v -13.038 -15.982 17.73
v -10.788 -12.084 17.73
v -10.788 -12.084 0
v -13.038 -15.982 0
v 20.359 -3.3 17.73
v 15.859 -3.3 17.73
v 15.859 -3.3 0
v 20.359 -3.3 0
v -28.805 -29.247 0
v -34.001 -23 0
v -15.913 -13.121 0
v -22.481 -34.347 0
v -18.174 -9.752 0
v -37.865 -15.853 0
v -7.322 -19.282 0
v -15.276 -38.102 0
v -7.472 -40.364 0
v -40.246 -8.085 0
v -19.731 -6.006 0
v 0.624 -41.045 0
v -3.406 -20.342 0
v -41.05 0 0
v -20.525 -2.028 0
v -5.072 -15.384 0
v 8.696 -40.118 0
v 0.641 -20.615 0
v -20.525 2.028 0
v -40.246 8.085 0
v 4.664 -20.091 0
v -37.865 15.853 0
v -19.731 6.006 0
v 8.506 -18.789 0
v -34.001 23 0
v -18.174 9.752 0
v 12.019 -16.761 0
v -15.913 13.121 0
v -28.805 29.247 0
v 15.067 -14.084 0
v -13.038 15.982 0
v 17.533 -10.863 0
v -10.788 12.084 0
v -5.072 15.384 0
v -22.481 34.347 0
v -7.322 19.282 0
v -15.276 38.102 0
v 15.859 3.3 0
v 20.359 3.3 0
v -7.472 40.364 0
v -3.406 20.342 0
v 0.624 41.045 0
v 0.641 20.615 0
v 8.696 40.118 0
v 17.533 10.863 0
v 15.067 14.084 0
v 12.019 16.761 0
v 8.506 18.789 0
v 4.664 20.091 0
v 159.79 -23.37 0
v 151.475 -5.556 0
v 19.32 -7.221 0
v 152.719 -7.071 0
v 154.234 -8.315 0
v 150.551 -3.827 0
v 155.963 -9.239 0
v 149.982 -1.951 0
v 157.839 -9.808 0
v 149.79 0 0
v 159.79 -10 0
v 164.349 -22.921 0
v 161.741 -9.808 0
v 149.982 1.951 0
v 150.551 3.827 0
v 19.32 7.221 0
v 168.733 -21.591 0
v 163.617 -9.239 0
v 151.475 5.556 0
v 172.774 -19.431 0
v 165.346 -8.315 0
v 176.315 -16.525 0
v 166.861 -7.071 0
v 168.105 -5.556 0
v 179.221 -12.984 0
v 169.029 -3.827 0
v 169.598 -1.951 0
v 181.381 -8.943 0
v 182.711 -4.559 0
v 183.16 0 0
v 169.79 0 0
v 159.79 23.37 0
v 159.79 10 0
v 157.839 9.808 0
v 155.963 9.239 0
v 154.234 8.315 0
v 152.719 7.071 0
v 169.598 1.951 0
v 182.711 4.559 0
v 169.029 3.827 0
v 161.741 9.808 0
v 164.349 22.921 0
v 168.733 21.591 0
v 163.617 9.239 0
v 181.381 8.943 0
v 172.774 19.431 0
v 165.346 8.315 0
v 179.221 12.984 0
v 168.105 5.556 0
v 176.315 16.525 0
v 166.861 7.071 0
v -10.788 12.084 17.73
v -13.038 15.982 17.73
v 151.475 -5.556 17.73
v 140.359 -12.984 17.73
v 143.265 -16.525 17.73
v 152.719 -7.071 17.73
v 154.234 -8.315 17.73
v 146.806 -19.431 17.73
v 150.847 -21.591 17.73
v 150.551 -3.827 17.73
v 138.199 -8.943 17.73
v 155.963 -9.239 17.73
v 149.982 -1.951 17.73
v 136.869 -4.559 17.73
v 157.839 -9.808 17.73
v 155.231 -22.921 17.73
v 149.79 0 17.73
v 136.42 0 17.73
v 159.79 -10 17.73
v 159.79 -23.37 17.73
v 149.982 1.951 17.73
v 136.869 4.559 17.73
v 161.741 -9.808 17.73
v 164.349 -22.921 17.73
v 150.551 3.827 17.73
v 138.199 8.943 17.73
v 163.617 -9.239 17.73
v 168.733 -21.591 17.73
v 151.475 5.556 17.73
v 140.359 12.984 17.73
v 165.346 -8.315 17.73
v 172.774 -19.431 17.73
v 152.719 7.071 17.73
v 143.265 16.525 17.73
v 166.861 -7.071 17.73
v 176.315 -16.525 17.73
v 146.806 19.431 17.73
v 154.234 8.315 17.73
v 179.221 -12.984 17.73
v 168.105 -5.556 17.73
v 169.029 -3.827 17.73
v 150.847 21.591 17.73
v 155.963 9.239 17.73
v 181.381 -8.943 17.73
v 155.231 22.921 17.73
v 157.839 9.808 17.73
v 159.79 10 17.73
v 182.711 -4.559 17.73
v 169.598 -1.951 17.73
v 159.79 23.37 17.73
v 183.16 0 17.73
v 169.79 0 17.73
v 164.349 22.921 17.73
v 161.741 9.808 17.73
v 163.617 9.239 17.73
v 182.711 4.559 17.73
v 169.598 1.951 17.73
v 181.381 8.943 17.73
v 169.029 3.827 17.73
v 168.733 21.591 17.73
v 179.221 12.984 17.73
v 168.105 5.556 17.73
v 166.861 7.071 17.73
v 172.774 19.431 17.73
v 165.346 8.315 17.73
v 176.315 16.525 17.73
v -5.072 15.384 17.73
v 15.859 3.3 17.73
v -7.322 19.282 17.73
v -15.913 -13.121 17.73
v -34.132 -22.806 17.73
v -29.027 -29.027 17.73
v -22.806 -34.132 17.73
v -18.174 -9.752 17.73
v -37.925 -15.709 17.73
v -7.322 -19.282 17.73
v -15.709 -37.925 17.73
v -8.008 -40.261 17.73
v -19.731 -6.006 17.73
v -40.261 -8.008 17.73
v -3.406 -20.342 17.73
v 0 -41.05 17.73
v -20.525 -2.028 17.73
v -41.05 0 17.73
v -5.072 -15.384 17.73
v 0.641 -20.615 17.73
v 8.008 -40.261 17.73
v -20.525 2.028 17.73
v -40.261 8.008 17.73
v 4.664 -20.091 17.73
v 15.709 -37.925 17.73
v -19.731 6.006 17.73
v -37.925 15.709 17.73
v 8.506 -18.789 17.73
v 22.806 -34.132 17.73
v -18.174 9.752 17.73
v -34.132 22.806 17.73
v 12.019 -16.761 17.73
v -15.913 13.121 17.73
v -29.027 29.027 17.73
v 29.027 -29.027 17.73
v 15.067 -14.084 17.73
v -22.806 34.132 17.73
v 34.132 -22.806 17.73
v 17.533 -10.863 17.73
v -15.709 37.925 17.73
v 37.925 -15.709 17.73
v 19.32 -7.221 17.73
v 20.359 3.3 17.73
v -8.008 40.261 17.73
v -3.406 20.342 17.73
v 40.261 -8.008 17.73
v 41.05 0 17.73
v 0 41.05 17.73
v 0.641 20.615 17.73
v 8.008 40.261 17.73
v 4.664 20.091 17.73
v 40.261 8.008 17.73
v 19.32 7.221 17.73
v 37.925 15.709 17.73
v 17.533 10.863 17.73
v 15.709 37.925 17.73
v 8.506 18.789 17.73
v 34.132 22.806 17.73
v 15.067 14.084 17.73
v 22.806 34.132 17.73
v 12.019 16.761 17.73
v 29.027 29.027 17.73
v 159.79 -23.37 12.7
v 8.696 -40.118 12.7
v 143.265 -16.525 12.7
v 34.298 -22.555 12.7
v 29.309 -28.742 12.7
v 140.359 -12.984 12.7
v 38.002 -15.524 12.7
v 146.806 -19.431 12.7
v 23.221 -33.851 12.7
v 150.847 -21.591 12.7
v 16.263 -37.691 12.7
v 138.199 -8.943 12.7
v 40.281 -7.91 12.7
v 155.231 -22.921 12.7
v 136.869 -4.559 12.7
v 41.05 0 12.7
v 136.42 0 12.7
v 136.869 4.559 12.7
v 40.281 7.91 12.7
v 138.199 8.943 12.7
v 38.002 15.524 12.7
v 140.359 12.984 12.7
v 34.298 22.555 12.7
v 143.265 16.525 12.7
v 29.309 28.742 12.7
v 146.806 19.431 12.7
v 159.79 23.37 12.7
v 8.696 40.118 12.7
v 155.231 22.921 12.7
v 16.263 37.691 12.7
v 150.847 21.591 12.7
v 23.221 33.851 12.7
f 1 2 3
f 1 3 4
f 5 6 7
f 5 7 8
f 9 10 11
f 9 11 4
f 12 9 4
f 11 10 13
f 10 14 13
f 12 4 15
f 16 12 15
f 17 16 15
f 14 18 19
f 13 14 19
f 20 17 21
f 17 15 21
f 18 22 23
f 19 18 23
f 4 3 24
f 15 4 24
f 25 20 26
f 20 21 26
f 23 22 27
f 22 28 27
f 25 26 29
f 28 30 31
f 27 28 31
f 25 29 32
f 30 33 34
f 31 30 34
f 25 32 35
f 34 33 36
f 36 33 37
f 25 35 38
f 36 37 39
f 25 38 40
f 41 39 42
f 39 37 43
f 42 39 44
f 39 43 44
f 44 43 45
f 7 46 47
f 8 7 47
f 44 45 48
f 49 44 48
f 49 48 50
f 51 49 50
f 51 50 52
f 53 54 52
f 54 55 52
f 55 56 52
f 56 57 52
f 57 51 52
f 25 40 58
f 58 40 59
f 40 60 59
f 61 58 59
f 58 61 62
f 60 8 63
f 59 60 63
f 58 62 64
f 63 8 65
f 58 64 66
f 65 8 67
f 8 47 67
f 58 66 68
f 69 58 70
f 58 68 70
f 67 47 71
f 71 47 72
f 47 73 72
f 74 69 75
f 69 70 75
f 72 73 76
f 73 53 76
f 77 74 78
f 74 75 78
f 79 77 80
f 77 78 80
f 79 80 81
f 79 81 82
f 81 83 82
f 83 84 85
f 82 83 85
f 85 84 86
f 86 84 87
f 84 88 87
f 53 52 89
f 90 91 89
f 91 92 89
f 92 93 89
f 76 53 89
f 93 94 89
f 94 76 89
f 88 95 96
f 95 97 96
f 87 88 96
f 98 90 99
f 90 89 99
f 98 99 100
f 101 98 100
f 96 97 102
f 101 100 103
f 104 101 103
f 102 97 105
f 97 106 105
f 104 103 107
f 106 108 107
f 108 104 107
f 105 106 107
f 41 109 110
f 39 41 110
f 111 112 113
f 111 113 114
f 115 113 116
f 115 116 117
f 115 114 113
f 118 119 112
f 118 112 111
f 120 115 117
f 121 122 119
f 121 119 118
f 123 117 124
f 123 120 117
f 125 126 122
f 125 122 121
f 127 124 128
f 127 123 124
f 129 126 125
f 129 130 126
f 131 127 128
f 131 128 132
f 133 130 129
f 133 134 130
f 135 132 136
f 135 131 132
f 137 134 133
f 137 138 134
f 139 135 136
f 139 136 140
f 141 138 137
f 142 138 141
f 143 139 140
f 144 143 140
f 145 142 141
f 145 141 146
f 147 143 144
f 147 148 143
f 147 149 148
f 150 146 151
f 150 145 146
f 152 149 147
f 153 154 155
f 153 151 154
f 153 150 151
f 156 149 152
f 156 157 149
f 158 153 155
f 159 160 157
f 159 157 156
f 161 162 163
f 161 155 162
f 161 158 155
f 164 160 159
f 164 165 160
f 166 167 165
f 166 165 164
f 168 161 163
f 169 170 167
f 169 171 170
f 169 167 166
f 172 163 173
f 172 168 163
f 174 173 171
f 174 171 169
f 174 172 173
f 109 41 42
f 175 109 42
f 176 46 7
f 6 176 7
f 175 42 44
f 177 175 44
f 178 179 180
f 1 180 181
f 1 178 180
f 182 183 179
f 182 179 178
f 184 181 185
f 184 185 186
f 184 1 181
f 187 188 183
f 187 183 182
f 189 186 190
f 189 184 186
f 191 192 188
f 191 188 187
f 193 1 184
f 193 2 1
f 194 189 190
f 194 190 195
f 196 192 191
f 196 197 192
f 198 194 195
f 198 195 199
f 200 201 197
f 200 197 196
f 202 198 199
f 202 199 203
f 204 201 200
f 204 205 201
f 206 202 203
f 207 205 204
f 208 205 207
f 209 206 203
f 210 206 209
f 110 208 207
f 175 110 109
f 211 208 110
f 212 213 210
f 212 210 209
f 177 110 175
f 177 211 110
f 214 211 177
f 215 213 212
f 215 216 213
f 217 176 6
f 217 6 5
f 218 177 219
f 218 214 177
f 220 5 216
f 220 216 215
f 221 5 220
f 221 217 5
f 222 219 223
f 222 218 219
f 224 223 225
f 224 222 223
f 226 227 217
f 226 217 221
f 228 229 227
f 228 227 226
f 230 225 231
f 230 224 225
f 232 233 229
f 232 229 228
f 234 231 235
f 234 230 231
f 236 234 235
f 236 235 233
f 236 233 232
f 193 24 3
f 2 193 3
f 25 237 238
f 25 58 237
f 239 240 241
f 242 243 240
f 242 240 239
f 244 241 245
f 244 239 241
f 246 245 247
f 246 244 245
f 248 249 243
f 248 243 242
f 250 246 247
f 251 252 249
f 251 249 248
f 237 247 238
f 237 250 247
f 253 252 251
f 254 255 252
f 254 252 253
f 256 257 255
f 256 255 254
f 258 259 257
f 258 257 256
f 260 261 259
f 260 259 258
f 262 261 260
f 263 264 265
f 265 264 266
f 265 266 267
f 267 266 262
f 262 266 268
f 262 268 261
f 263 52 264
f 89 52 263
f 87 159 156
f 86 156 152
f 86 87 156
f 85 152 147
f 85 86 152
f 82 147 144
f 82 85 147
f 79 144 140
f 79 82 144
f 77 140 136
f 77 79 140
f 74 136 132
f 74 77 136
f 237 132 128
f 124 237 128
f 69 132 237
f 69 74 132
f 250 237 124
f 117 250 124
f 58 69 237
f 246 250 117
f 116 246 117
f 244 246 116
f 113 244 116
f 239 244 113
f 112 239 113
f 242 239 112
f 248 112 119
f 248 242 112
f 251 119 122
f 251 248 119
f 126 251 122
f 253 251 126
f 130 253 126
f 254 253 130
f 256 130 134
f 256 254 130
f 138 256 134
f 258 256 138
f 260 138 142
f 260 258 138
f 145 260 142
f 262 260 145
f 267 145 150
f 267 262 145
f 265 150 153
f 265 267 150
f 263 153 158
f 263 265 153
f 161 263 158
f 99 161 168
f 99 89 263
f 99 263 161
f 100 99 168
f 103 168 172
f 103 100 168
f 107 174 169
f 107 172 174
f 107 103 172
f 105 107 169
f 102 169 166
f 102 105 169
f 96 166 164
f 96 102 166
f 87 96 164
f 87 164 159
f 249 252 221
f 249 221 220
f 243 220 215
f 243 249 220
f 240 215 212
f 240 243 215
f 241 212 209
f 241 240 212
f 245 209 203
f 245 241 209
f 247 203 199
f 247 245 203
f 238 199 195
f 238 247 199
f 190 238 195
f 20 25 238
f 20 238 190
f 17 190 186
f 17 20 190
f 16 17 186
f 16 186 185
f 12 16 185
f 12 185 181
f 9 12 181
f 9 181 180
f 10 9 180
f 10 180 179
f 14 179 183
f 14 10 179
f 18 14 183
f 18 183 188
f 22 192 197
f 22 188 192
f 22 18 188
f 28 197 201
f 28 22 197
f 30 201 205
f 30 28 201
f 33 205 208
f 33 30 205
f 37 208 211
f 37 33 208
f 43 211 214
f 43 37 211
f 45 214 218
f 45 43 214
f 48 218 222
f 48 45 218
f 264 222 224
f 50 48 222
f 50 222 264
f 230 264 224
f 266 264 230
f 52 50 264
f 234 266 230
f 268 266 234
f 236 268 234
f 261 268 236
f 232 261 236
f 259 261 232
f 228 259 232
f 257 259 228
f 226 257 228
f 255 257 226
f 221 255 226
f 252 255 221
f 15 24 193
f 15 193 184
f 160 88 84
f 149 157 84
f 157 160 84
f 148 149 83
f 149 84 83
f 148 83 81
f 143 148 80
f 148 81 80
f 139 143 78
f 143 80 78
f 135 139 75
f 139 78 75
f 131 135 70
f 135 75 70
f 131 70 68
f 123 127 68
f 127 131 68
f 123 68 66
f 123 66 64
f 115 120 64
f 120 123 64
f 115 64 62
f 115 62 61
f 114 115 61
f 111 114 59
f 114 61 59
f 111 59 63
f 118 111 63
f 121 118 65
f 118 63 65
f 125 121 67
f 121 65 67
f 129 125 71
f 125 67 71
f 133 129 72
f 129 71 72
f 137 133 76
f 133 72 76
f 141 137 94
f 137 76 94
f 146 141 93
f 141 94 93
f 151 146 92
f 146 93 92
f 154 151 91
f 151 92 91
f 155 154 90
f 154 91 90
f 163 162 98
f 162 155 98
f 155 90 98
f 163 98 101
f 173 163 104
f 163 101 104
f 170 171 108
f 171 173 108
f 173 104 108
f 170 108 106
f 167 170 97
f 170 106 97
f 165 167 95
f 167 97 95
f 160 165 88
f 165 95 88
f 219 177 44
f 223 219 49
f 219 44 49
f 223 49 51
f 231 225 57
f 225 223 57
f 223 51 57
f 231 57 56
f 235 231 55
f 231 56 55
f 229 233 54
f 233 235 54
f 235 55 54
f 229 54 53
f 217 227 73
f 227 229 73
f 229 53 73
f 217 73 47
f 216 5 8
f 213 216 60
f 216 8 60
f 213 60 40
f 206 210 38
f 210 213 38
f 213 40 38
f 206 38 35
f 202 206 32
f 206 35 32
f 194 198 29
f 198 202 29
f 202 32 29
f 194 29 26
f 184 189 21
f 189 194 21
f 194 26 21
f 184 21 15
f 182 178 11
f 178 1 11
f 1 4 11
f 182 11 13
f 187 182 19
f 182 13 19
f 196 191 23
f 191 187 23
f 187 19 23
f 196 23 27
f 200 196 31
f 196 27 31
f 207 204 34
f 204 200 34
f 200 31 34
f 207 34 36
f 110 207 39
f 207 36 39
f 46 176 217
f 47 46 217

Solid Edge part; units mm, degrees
sketch "Sketch1" plane through (0, 0, 0) normal (0, 0, 1) x (1, 0, 0)
  circle A0 centre (0, 0) radius 41.05
  circle A1 centre (0, 0) radius 20.625
  circle A2 centre (159.79, 0) radius 23.37
  circle A3 centre (159.79, 0) radius 10
  dimension "D1" = 159.79
extrude "Protrusion1" add sketch "Sketch1" along normal blind 17.73
sketch "Sketch2" plane through (0, 0, 0) normal (0, 0, 1) x (1, 0, 0)
  line L0 (159.79, -23.37) -> (139.6358, 0)
  line L1 (139.6358, 0) -> (159.79, 23.37)
  line L2 (8.6959, 40.1184) -> (159.79, 23.37)
  line L3 (8.6959, 40.1184) -> (28.7283, 0)
  line L4 (28.7283, 0) -> (8.6959, -40.1184)
  line L5 (159.79, -23.37) -> (8.6959, -40.1184)
extrude "ExtrudedProtrusion_2" add sketch "Sketch2" along normal blind 12.7
sketch "Sketch3" plane through (0, 0, 0) normal (0, 0, 1) x (1, 0, 0)
  line L0 (-5.0718, -15.3845) -> (-10.7875, -12.0845)
  line L1 (-10.7875, -12.0845) -> (-13.2875, -16.4147)
  line L2 (-13.2875, -16.4147) -> (-7.5718, -19.7147)
  line L3 (-5.0718, -15.3845) -> (-7.5718, -19.7147)
  line L4 (-10.7875, 12.0845) -> (-5.0718, 15.3845)
  line L5 (-5.0718, 15.3845) -> (-7.5718, 19.7147)
  line L6 (-7.5718, 19.7147) -> (-13.2875, 16.4147)
  line L7 (-10.7875, 12.0845) -> (-13.2875, 16.4147)
  line L8 (15.8593, -3.3) -> (20.8593, -3.3)
  line L9 (20.8593, -3.3) -> (20.8593, 3.3)
  line L10 (15.8593, 3.3) -> (20.8593, 3.3)
  line L11 (15.8593, 3.3) -> (15.8593, -3.3)
  dimension "D1" = 159.79
extrude "Protrusion2" add sketch "Sketch3" along normal up to vertex (17.73 mm away)
